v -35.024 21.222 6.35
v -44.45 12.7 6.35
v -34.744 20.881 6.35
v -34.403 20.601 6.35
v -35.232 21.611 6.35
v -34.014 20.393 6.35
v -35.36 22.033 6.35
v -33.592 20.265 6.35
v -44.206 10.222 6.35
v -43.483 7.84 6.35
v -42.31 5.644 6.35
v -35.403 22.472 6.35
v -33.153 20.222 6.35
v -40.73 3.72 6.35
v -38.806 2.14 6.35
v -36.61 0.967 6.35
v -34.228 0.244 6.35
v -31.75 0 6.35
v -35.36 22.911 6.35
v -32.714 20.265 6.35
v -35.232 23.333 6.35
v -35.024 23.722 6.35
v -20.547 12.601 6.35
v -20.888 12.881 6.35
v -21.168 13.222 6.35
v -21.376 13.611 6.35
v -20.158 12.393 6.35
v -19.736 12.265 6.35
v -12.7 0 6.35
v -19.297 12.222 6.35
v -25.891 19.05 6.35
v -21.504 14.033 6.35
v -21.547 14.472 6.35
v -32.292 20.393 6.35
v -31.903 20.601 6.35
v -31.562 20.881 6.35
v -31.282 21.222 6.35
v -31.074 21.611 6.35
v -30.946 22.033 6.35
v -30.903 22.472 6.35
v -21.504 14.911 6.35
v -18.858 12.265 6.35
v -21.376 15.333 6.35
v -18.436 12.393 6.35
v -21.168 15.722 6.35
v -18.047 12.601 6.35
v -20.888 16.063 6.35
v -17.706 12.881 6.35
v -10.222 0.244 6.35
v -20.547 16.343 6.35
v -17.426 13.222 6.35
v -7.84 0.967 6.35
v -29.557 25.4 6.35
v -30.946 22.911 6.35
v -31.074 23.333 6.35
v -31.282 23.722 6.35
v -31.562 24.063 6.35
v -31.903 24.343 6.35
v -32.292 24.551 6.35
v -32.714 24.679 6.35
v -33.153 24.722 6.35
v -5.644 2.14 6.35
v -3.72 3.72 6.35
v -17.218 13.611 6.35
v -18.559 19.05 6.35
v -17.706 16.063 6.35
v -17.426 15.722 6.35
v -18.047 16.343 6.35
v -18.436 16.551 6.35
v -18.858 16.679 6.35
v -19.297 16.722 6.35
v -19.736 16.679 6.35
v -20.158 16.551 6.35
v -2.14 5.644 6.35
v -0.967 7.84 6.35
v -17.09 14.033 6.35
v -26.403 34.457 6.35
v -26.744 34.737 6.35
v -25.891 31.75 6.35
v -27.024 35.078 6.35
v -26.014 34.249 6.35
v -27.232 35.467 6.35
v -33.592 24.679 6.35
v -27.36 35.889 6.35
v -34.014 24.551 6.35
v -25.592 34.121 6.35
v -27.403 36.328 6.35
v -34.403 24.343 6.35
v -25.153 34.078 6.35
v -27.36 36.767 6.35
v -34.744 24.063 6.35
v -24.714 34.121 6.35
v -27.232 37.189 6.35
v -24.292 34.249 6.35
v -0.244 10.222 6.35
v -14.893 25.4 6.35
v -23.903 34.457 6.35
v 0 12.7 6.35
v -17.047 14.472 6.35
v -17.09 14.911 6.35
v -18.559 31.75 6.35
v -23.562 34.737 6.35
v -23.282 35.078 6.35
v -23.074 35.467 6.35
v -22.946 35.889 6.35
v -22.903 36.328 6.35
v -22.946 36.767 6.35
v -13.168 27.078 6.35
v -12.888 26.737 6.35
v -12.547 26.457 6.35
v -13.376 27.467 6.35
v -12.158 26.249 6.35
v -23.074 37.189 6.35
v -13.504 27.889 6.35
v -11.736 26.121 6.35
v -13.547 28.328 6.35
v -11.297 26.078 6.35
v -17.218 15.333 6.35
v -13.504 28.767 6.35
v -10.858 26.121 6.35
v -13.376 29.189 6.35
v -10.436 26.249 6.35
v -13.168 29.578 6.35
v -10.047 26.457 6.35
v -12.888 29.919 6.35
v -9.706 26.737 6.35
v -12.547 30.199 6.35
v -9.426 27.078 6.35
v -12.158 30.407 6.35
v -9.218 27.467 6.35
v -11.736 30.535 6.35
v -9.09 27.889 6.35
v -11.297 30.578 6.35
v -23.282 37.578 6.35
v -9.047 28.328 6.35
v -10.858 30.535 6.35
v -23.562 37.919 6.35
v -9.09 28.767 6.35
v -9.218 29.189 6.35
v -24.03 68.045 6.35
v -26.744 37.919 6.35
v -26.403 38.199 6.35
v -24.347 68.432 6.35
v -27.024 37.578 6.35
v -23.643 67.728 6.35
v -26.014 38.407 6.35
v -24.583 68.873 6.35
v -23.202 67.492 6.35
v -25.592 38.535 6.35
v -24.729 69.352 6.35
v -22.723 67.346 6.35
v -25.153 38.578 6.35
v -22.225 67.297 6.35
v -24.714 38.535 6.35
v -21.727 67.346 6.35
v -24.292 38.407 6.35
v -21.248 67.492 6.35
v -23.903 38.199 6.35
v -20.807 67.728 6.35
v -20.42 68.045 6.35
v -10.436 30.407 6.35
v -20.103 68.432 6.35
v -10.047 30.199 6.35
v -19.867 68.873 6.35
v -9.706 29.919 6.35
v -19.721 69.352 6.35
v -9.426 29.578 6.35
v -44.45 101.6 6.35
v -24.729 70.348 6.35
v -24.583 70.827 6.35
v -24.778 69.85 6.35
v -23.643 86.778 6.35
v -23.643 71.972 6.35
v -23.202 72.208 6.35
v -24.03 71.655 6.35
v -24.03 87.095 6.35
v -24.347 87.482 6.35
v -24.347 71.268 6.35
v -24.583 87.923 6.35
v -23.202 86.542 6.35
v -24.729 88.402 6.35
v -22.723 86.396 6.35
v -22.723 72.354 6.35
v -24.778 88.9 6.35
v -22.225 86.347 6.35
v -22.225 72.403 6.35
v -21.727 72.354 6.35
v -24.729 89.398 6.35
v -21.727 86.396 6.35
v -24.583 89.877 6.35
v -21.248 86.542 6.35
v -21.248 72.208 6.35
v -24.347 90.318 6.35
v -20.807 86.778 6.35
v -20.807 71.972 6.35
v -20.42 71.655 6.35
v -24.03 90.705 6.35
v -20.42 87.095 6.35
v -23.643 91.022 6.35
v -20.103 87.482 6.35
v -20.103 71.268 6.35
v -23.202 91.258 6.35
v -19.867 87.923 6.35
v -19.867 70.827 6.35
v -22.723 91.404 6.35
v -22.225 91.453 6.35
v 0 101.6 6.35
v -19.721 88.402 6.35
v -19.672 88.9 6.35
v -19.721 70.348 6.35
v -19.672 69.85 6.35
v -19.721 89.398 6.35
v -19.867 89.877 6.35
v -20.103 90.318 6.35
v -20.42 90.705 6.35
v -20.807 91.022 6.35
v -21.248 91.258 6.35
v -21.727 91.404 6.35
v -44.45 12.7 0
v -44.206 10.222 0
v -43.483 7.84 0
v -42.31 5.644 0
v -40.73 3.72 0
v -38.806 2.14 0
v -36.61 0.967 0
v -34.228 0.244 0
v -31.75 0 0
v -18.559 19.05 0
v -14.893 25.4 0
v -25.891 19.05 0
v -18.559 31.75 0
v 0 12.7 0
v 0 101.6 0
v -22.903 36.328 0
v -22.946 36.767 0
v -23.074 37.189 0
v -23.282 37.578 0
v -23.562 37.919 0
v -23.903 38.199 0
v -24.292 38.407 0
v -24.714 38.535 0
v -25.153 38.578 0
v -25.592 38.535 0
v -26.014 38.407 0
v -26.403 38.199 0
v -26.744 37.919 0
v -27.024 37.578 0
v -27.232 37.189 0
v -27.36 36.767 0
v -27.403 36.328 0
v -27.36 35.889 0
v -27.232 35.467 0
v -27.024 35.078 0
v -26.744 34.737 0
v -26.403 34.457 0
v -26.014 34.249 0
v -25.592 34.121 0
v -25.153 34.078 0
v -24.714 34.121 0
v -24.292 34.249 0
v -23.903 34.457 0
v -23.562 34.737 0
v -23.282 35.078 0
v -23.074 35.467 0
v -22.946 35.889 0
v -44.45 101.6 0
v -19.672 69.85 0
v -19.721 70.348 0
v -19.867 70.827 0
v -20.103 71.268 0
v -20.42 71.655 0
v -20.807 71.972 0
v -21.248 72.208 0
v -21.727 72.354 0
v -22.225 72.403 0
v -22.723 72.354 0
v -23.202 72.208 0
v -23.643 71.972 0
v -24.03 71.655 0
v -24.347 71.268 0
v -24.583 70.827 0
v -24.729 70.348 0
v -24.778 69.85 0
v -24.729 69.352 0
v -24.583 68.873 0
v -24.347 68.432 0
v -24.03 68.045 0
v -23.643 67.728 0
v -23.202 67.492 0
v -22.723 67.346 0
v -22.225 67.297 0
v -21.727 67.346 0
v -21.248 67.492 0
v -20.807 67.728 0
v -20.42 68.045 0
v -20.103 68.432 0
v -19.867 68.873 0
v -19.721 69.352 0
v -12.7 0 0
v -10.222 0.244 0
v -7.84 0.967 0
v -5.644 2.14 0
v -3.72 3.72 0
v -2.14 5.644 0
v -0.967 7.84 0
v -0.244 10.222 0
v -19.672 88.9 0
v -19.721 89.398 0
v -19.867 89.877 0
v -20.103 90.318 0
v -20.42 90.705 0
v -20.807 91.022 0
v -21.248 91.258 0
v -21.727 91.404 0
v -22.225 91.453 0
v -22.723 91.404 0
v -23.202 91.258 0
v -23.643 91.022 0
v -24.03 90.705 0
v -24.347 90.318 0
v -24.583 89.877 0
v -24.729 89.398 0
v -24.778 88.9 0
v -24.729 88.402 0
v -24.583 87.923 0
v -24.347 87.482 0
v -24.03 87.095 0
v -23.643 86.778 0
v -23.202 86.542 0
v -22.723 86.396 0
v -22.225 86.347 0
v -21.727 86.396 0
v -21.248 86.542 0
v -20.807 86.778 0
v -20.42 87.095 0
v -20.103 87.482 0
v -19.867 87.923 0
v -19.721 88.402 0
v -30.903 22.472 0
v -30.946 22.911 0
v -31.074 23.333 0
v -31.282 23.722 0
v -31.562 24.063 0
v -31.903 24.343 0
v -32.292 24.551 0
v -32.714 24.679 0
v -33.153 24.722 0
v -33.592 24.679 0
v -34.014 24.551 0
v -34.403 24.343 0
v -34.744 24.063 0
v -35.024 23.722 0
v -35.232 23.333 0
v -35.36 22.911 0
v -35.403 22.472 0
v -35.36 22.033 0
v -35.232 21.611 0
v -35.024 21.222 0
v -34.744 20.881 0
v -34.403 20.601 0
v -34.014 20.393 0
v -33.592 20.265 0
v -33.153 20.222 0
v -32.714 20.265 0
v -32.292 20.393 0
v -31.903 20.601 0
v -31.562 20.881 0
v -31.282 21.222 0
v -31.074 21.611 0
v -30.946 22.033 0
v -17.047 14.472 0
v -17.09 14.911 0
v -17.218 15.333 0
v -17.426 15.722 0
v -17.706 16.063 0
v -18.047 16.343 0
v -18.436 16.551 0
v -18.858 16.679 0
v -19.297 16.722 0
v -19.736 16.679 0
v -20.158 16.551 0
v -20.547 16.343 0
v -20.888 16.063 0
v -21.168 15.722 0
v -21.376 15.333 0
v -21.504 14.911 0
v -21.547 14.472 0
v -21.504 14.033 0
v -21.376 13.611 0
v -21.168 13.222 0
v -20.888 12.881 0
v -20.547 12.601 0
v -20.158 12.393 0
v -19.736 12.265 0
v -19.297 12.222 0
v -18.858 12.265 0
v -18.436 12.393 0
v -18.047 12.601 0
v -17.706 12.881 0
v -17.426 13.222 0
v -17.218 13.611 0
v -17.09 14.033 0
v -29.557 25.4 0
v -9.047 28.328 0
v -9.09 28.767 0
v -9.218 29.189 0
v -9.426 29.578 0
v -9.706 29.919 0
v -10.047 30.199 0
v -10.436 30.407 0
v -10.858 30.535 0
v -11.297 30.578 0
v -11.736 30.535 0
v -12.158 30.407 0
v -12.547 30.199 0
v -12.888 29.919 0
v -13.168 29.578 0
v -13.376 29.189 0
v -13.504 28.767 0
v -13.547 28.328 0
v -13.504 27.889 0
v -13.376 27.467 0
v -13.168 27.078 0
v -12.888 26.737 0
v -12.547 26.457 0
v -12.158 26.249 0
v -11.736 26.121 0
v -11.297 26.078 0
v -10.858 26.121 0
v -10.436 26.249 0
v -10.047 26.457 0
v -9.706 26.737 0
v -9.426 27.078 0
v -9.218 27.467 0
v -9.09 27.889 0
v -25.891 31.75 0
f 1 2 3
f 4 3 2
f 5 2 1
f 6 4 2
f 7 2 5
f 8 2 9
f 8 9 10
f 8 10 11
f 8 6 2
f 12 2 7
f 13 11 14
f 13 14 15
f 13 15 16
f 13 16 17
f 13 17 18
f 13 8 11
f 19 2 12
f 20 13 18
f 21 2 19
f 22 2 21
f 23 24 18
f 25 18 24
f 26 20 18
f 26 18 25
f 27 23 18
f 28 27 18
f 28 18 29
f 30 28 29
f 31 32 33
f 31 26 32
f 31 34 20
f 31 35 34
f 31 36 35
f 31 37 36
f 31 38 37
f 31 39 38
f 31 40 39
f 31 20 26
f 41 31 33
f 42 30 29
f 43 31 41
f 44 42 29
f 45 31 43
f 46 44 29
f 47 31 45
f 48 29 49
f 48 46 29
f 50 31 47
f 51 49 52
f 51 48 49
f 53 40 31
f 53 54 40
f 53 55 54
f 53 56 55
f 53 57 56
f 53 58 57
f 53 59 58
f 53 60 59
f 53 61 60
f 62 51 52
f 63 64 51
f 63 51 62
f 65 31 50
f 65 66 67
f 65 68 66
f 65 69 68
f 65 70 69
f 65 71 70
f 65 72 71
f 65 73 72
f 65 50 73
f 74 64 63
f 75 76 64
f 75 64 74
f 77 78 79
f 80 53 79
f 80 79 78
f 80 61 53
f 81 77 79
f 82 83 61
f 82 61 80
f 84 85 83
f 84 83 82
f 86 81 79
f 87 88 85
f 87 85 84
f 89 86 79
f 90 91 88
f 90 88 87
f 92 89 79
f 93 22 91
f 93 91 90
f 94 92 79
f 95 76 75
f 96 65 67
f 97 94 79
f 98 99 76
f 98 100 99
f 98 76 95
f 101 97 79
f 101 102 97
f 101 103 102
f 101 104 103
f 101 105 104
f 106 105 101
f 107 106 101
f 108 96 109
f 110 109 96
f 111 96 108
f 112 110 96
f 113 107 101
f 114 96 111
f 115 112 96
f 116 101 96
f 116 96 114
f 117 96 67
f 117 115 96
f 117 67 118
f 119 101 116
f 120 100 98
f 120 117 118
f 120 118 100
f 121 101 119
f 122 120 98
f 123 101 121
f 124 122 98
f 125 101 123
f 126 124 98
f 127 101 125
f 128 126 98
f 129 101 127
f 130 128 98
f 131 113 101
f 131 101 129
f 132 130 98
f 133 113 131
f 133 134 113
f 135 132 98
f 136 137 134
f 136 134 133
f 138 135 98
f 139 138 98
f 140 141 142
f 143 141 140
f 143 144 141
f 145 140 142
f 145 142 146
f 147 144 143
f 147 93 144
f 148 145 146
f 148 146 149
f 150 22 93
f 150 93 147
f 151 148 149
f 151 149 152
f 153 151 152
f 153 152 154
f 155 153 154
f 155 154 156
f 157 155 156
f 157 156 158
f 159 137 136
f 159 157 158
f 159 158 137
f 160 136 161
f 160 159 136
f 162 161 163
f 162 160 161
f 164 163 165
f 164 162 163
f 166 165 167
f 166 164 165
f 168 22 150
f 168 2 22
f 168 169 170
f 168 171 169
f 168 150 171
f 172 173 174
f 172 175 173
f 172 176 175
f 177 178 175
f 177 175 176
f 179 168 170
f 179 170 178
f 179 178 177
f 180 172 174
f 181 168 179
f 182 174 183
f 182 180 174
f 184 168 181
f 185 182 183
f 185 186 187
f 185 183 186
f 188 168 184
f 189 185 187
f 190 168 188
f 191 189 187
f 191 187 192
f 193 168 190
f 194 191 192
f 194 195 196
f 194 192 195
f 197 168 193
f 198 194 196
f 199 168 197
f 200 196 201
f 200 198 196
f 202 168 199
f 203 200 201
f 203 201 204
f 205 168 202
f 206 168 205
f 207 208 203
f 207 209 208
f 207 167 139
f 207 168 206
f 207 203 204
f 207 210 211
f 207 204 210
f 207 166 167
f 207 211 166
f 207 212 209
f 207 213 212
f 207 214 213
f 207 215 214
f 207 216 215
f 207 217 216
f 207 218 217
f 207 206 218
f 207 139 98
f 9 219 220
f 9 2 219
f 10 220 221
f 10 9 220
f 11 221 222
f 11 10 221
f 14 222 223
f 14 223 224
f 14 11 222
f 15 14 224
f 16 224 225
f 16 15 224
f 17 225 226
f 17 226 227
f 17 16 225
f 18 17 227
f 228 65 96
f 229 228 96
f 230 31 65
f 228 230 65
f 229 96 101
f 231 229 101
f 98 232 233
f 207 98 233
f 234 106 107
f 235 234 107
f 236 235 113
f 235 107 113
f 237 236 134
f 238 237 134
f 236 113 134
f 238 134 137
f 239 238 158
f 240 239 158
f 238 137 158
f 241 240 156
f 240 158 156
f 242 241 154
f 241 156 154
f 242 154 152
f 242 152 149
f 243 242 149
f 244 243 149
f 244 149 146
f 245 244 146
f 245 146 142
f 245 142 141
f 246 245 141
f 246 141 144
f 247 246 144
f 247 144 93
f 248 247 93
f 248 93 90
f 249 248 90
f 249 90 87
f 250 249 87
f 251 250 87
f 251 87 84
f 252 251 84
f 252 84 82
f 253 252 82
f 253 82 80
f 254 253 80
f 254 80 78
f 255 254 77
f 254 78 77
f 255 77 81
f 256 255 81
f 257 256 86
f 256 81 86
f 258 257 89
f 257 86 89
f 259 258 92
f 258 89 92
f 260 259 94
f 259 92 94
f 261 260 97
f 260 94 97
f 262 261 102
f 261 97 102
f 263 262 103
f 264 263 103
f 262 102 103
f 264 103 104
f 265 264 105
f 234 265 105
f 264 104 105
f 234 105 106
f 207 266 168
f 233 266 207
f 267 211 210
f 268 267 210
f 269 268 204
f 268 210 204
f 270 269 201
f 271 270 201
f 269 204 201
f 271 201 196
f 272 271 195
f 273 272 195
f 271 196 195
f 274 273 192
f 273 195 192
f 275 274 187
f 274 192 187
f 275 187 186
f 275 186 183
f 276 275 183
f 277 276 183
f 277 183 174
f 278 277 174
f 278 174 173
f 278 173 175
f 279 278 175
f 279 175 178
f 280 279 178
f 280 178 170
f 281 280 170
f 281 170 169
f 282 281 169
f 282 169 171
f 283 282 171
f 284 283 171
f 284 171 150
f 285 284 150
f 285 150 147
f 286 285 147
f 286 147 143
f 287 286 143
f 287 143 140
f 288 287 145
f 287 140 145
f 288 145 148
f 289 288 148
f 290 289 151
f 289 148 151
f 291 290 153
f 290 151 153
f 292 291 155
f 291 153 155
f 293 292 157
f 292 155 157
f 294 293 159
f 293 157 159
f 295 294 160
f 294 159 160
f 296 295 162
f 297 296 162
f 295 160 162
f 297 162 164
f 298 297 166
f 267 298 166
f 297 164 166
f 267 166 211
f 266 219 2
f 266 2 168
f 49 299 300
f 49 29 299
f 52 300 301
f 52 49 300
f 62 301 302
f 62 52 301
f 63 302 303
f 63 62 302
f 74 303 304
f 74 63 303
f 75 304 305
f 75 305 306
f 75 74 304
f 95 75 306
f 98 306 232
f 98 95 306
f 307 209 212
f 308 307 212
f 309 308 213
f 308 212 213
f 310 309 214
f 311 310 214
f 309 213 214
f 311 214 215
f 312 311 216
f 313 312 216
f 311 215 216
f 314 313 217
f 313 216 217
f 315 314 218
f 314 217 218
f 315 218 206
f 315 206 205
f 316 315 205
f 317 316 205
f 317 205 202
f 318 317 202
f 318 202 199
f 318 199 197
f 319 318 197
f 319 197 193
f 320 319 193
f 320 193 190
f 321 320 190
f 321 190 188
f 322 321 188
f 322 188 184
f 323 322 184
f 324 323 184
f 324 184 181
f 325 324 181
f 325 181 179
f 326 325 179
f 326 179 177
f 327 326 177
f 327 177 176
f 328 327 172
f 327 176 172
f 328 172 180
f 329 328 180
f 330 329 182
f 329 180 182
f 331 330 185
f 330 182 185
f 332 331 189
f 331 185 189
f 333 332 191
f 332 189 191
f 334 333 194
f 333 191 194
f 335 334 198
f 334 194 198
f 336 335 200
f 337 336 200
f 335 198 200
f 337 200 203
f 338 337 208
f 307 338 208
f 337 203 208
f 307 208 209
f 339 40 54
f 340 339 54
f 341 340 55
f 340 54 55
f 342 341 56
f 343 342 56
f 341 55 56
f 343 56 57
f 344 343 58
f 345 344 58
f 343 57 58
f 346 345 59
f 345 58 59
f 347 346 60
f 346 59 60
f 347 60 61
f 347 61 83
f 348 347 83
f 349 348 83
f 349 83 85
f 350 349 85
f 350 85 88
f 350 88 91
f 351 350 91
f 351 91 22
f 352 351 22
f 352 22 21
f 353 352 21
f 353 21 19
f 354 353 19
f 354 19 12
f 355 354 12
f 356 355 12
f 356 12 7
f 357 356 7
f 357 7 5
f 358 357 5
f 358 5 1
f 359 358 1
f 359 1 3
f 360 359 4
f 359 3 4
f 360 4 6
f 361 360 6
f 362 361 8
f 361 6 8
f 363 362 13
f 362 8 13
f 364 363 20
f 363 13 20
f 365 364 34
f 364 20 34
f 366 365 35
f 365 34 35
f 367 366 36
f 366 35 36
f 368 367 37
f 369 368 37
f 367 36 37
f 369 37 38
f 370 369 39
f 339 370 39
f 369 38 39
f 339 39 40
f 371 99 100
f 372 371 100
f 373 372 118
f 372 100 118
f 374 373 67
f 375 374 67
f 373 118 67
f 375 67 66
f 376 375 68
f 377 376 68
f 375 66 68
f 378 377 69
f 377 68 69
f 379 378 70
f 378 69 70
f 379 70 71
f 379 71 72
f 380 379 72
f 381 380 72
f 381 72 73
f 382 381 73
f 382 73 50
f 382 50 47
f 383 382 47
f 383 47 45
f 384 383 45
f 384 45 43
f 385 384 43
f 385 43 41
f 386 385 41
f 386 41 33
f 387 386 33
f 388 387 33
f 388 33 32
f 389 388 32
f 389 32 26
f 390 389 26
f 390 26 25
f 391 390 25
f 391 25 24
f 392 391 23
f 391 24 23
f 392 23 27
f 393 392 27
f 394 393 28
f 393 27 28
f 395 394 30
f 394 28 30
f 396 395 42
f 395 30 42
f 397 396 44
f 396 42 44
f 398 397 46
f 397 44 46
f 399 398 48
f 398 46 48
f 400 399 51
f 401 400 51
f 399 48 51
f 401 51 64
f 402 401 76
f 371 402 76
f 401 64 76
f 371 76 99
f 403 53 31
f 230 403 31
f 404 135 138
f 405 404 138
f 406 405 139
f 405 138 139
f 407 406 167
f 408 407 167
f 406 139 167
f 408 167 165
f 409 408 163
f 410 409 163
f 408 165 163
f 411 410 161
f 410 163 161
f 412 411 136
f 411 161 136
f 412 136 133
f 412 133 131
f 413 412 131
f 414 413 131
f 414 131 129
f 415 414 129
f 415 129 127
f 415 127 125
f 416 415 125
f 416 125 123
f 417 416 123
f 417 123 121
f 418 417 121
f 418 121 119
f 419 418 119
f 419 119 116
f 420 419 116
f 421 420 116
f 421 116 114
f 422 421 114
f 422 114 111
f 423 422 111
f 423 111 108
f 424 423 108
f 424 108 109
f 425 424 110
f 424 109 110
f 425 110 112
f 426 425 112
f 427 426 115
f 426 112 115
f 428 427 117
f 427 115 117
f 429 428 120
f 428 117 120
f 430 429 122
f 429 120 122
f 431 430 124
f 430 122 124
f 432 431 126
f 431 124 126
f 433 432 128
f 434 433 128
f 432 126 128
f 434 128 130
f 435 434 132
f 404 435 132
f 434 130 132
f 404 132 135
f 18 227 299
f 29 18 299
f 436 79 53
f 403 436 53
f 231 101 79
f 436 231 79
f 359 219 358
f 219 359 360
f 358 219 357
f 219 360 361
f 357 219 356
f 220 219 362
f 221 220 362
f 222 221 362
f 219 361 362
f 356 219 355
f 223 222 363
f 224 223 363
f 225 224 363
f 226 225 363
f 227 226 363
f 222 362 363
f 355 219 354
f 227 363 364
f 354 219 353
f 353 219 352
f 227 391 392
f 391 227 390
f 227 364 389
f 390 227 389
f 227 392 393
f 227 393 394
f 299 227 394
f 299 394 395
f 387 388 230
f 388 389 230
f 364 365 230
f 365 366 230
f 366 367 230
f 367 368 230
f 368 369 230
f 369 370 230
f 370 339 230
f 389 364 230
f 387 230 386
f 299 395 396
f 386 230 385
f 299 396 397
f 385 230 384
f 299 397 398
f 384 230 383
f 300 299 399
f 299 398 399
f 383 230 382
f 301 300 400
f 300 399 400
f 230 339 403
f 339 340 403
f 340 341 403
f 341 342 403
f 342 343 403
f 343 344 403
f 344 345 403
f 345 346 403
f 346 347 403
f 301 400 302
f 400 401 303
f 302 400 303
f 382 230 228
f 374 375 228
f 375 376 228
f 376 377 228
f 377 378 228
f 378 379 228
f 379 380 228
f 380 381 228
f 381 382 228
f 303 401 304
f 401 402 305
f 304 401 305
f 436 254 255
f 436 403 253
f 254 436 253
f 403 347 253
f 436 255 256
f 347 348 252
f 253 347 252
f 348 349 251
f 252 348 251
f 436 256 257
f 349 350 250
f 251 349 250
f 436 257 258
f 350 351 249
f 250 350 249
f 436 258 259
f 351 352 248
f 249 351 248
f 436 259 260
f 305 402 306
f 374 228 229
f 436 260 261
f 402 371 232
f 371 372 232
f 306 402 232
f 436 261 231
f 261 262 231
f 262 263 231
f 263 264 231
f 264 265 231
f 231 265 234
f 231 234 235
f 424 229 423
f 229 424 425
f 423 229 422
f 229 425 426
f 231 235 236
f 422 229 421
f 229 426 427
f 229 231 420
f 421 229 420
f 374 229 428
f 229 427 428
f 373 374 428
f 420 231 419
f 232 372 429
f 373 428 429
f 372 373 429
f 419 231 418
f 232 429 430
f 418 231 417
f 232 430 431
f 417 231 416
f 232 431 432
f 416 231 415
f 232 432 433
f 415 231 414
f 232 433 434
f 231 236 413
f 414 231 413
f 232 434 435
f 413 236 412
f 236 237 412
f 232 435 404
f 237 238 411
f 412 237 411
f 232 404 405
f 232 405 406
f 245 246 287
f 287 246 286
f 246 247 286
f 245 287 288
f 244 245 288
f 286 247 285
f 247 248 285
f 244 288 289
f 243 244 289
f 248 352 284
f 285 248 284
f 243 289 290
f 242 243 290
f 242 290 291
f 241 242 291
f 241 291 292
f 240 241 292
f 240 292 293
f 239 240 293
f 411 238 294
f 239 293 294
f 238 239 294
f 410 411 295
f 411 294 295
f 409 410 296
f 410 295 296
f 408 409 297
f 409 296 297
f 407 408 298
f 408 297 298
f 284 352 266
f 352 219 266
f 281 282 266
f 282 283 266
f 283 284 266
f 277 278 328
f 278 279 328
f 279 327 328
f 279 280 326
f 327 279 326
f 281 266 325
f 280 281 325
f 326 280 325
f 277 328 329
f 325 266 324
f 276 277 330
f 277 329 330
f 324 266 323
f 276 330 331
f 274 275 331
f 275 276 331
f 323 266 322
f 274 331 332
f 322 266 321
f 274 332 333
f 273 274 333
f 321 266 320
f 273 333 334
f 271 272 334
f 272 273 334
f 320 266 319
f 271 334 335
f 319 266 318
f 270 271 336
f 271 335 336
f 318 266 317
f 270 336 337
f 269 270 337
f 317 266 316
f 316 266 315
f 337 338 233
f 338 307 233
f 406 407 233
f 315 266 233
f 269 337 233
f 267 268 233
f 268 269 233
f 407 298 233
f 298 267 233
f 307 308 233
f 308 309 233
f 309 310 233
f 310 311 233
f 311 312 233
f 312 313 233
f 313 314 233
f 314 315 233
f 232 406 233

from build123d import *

# Parameters (mm, degrees)
SKETCH1_W                  = 44.45
SKETCH1_H                  = 101.6
BOSS_EXTRUDE2_DEPTH        = 6.35
FILLET1_R                  = 12.7
F_7_0_201_DIAMETER_HOLE2_D = 5.1054
CUT_EXTRUDE1_DEPTH         = 112.079633597
M4_CLEARANCE_HOLE1_D       = 4.5


with BuildPart() as part:
    # Sketch1 → Boss-Extrude2 (new body)
    with BuildSketch(Plane.XY):
        with Locations((-22.225, 50.8)):
            Rectangle(SKETCH1_W, SKETCH1_H)
    extrude(amount=BOSS_EXTRUDE2_DEPTH)

    # Fillet1
    fillet1_edges = [part.edges().sort_by_distance(p)[0] for p in [
        (0, 0, 3.175),
        (-44.45, 0, 3.175),
    ]]
    fillet(fillet1_edges, radius=FILLET1_R)

    # #7 (0.201) Diameter Hole2 (through all)
    with Locations(Plane(origin=(0, 0, 0), x_dir=(-1, 0, 0), z_dir=(0, 0, -1))):
        with Locations((22.225, 88.9), (22.225, 69.85)):
            Hole(F_7_0_201_DIAMETER_HOLE2_D / 2)

    # Sketch14 → Cut-Extrude1 (cut, through all)
    with BuildSketch(Plane.XY.offset(6.35)):
        Polygon((-14.892651581, 25.4), (-18.558825791, 31.75), (-25.891174209, 31.75), (-29.557348419, 25.4), (-25.891174209, 19.05), (-18.558825791, 19.05), align=None)
    extrude(amount=-CUT_EXTRUDE1_DEPTH, mode=Mode.SUBTRACT)

    # M4 Clearance Hole1 (through all)
    with Locations(Plane(origin=(0, 0, 0), x_dir=(-1, 0, 0), z_dir=(0, 0, -1))):
        with Locations((11.29679677, 28.32820323), (25.15320323, 36.32820323), (33.15320323, 22.47179677), (19.29679677, 14.47179677)):
            Hole(M4_CLEARANCE_HOLE1_D / 2)


solid = part.part
